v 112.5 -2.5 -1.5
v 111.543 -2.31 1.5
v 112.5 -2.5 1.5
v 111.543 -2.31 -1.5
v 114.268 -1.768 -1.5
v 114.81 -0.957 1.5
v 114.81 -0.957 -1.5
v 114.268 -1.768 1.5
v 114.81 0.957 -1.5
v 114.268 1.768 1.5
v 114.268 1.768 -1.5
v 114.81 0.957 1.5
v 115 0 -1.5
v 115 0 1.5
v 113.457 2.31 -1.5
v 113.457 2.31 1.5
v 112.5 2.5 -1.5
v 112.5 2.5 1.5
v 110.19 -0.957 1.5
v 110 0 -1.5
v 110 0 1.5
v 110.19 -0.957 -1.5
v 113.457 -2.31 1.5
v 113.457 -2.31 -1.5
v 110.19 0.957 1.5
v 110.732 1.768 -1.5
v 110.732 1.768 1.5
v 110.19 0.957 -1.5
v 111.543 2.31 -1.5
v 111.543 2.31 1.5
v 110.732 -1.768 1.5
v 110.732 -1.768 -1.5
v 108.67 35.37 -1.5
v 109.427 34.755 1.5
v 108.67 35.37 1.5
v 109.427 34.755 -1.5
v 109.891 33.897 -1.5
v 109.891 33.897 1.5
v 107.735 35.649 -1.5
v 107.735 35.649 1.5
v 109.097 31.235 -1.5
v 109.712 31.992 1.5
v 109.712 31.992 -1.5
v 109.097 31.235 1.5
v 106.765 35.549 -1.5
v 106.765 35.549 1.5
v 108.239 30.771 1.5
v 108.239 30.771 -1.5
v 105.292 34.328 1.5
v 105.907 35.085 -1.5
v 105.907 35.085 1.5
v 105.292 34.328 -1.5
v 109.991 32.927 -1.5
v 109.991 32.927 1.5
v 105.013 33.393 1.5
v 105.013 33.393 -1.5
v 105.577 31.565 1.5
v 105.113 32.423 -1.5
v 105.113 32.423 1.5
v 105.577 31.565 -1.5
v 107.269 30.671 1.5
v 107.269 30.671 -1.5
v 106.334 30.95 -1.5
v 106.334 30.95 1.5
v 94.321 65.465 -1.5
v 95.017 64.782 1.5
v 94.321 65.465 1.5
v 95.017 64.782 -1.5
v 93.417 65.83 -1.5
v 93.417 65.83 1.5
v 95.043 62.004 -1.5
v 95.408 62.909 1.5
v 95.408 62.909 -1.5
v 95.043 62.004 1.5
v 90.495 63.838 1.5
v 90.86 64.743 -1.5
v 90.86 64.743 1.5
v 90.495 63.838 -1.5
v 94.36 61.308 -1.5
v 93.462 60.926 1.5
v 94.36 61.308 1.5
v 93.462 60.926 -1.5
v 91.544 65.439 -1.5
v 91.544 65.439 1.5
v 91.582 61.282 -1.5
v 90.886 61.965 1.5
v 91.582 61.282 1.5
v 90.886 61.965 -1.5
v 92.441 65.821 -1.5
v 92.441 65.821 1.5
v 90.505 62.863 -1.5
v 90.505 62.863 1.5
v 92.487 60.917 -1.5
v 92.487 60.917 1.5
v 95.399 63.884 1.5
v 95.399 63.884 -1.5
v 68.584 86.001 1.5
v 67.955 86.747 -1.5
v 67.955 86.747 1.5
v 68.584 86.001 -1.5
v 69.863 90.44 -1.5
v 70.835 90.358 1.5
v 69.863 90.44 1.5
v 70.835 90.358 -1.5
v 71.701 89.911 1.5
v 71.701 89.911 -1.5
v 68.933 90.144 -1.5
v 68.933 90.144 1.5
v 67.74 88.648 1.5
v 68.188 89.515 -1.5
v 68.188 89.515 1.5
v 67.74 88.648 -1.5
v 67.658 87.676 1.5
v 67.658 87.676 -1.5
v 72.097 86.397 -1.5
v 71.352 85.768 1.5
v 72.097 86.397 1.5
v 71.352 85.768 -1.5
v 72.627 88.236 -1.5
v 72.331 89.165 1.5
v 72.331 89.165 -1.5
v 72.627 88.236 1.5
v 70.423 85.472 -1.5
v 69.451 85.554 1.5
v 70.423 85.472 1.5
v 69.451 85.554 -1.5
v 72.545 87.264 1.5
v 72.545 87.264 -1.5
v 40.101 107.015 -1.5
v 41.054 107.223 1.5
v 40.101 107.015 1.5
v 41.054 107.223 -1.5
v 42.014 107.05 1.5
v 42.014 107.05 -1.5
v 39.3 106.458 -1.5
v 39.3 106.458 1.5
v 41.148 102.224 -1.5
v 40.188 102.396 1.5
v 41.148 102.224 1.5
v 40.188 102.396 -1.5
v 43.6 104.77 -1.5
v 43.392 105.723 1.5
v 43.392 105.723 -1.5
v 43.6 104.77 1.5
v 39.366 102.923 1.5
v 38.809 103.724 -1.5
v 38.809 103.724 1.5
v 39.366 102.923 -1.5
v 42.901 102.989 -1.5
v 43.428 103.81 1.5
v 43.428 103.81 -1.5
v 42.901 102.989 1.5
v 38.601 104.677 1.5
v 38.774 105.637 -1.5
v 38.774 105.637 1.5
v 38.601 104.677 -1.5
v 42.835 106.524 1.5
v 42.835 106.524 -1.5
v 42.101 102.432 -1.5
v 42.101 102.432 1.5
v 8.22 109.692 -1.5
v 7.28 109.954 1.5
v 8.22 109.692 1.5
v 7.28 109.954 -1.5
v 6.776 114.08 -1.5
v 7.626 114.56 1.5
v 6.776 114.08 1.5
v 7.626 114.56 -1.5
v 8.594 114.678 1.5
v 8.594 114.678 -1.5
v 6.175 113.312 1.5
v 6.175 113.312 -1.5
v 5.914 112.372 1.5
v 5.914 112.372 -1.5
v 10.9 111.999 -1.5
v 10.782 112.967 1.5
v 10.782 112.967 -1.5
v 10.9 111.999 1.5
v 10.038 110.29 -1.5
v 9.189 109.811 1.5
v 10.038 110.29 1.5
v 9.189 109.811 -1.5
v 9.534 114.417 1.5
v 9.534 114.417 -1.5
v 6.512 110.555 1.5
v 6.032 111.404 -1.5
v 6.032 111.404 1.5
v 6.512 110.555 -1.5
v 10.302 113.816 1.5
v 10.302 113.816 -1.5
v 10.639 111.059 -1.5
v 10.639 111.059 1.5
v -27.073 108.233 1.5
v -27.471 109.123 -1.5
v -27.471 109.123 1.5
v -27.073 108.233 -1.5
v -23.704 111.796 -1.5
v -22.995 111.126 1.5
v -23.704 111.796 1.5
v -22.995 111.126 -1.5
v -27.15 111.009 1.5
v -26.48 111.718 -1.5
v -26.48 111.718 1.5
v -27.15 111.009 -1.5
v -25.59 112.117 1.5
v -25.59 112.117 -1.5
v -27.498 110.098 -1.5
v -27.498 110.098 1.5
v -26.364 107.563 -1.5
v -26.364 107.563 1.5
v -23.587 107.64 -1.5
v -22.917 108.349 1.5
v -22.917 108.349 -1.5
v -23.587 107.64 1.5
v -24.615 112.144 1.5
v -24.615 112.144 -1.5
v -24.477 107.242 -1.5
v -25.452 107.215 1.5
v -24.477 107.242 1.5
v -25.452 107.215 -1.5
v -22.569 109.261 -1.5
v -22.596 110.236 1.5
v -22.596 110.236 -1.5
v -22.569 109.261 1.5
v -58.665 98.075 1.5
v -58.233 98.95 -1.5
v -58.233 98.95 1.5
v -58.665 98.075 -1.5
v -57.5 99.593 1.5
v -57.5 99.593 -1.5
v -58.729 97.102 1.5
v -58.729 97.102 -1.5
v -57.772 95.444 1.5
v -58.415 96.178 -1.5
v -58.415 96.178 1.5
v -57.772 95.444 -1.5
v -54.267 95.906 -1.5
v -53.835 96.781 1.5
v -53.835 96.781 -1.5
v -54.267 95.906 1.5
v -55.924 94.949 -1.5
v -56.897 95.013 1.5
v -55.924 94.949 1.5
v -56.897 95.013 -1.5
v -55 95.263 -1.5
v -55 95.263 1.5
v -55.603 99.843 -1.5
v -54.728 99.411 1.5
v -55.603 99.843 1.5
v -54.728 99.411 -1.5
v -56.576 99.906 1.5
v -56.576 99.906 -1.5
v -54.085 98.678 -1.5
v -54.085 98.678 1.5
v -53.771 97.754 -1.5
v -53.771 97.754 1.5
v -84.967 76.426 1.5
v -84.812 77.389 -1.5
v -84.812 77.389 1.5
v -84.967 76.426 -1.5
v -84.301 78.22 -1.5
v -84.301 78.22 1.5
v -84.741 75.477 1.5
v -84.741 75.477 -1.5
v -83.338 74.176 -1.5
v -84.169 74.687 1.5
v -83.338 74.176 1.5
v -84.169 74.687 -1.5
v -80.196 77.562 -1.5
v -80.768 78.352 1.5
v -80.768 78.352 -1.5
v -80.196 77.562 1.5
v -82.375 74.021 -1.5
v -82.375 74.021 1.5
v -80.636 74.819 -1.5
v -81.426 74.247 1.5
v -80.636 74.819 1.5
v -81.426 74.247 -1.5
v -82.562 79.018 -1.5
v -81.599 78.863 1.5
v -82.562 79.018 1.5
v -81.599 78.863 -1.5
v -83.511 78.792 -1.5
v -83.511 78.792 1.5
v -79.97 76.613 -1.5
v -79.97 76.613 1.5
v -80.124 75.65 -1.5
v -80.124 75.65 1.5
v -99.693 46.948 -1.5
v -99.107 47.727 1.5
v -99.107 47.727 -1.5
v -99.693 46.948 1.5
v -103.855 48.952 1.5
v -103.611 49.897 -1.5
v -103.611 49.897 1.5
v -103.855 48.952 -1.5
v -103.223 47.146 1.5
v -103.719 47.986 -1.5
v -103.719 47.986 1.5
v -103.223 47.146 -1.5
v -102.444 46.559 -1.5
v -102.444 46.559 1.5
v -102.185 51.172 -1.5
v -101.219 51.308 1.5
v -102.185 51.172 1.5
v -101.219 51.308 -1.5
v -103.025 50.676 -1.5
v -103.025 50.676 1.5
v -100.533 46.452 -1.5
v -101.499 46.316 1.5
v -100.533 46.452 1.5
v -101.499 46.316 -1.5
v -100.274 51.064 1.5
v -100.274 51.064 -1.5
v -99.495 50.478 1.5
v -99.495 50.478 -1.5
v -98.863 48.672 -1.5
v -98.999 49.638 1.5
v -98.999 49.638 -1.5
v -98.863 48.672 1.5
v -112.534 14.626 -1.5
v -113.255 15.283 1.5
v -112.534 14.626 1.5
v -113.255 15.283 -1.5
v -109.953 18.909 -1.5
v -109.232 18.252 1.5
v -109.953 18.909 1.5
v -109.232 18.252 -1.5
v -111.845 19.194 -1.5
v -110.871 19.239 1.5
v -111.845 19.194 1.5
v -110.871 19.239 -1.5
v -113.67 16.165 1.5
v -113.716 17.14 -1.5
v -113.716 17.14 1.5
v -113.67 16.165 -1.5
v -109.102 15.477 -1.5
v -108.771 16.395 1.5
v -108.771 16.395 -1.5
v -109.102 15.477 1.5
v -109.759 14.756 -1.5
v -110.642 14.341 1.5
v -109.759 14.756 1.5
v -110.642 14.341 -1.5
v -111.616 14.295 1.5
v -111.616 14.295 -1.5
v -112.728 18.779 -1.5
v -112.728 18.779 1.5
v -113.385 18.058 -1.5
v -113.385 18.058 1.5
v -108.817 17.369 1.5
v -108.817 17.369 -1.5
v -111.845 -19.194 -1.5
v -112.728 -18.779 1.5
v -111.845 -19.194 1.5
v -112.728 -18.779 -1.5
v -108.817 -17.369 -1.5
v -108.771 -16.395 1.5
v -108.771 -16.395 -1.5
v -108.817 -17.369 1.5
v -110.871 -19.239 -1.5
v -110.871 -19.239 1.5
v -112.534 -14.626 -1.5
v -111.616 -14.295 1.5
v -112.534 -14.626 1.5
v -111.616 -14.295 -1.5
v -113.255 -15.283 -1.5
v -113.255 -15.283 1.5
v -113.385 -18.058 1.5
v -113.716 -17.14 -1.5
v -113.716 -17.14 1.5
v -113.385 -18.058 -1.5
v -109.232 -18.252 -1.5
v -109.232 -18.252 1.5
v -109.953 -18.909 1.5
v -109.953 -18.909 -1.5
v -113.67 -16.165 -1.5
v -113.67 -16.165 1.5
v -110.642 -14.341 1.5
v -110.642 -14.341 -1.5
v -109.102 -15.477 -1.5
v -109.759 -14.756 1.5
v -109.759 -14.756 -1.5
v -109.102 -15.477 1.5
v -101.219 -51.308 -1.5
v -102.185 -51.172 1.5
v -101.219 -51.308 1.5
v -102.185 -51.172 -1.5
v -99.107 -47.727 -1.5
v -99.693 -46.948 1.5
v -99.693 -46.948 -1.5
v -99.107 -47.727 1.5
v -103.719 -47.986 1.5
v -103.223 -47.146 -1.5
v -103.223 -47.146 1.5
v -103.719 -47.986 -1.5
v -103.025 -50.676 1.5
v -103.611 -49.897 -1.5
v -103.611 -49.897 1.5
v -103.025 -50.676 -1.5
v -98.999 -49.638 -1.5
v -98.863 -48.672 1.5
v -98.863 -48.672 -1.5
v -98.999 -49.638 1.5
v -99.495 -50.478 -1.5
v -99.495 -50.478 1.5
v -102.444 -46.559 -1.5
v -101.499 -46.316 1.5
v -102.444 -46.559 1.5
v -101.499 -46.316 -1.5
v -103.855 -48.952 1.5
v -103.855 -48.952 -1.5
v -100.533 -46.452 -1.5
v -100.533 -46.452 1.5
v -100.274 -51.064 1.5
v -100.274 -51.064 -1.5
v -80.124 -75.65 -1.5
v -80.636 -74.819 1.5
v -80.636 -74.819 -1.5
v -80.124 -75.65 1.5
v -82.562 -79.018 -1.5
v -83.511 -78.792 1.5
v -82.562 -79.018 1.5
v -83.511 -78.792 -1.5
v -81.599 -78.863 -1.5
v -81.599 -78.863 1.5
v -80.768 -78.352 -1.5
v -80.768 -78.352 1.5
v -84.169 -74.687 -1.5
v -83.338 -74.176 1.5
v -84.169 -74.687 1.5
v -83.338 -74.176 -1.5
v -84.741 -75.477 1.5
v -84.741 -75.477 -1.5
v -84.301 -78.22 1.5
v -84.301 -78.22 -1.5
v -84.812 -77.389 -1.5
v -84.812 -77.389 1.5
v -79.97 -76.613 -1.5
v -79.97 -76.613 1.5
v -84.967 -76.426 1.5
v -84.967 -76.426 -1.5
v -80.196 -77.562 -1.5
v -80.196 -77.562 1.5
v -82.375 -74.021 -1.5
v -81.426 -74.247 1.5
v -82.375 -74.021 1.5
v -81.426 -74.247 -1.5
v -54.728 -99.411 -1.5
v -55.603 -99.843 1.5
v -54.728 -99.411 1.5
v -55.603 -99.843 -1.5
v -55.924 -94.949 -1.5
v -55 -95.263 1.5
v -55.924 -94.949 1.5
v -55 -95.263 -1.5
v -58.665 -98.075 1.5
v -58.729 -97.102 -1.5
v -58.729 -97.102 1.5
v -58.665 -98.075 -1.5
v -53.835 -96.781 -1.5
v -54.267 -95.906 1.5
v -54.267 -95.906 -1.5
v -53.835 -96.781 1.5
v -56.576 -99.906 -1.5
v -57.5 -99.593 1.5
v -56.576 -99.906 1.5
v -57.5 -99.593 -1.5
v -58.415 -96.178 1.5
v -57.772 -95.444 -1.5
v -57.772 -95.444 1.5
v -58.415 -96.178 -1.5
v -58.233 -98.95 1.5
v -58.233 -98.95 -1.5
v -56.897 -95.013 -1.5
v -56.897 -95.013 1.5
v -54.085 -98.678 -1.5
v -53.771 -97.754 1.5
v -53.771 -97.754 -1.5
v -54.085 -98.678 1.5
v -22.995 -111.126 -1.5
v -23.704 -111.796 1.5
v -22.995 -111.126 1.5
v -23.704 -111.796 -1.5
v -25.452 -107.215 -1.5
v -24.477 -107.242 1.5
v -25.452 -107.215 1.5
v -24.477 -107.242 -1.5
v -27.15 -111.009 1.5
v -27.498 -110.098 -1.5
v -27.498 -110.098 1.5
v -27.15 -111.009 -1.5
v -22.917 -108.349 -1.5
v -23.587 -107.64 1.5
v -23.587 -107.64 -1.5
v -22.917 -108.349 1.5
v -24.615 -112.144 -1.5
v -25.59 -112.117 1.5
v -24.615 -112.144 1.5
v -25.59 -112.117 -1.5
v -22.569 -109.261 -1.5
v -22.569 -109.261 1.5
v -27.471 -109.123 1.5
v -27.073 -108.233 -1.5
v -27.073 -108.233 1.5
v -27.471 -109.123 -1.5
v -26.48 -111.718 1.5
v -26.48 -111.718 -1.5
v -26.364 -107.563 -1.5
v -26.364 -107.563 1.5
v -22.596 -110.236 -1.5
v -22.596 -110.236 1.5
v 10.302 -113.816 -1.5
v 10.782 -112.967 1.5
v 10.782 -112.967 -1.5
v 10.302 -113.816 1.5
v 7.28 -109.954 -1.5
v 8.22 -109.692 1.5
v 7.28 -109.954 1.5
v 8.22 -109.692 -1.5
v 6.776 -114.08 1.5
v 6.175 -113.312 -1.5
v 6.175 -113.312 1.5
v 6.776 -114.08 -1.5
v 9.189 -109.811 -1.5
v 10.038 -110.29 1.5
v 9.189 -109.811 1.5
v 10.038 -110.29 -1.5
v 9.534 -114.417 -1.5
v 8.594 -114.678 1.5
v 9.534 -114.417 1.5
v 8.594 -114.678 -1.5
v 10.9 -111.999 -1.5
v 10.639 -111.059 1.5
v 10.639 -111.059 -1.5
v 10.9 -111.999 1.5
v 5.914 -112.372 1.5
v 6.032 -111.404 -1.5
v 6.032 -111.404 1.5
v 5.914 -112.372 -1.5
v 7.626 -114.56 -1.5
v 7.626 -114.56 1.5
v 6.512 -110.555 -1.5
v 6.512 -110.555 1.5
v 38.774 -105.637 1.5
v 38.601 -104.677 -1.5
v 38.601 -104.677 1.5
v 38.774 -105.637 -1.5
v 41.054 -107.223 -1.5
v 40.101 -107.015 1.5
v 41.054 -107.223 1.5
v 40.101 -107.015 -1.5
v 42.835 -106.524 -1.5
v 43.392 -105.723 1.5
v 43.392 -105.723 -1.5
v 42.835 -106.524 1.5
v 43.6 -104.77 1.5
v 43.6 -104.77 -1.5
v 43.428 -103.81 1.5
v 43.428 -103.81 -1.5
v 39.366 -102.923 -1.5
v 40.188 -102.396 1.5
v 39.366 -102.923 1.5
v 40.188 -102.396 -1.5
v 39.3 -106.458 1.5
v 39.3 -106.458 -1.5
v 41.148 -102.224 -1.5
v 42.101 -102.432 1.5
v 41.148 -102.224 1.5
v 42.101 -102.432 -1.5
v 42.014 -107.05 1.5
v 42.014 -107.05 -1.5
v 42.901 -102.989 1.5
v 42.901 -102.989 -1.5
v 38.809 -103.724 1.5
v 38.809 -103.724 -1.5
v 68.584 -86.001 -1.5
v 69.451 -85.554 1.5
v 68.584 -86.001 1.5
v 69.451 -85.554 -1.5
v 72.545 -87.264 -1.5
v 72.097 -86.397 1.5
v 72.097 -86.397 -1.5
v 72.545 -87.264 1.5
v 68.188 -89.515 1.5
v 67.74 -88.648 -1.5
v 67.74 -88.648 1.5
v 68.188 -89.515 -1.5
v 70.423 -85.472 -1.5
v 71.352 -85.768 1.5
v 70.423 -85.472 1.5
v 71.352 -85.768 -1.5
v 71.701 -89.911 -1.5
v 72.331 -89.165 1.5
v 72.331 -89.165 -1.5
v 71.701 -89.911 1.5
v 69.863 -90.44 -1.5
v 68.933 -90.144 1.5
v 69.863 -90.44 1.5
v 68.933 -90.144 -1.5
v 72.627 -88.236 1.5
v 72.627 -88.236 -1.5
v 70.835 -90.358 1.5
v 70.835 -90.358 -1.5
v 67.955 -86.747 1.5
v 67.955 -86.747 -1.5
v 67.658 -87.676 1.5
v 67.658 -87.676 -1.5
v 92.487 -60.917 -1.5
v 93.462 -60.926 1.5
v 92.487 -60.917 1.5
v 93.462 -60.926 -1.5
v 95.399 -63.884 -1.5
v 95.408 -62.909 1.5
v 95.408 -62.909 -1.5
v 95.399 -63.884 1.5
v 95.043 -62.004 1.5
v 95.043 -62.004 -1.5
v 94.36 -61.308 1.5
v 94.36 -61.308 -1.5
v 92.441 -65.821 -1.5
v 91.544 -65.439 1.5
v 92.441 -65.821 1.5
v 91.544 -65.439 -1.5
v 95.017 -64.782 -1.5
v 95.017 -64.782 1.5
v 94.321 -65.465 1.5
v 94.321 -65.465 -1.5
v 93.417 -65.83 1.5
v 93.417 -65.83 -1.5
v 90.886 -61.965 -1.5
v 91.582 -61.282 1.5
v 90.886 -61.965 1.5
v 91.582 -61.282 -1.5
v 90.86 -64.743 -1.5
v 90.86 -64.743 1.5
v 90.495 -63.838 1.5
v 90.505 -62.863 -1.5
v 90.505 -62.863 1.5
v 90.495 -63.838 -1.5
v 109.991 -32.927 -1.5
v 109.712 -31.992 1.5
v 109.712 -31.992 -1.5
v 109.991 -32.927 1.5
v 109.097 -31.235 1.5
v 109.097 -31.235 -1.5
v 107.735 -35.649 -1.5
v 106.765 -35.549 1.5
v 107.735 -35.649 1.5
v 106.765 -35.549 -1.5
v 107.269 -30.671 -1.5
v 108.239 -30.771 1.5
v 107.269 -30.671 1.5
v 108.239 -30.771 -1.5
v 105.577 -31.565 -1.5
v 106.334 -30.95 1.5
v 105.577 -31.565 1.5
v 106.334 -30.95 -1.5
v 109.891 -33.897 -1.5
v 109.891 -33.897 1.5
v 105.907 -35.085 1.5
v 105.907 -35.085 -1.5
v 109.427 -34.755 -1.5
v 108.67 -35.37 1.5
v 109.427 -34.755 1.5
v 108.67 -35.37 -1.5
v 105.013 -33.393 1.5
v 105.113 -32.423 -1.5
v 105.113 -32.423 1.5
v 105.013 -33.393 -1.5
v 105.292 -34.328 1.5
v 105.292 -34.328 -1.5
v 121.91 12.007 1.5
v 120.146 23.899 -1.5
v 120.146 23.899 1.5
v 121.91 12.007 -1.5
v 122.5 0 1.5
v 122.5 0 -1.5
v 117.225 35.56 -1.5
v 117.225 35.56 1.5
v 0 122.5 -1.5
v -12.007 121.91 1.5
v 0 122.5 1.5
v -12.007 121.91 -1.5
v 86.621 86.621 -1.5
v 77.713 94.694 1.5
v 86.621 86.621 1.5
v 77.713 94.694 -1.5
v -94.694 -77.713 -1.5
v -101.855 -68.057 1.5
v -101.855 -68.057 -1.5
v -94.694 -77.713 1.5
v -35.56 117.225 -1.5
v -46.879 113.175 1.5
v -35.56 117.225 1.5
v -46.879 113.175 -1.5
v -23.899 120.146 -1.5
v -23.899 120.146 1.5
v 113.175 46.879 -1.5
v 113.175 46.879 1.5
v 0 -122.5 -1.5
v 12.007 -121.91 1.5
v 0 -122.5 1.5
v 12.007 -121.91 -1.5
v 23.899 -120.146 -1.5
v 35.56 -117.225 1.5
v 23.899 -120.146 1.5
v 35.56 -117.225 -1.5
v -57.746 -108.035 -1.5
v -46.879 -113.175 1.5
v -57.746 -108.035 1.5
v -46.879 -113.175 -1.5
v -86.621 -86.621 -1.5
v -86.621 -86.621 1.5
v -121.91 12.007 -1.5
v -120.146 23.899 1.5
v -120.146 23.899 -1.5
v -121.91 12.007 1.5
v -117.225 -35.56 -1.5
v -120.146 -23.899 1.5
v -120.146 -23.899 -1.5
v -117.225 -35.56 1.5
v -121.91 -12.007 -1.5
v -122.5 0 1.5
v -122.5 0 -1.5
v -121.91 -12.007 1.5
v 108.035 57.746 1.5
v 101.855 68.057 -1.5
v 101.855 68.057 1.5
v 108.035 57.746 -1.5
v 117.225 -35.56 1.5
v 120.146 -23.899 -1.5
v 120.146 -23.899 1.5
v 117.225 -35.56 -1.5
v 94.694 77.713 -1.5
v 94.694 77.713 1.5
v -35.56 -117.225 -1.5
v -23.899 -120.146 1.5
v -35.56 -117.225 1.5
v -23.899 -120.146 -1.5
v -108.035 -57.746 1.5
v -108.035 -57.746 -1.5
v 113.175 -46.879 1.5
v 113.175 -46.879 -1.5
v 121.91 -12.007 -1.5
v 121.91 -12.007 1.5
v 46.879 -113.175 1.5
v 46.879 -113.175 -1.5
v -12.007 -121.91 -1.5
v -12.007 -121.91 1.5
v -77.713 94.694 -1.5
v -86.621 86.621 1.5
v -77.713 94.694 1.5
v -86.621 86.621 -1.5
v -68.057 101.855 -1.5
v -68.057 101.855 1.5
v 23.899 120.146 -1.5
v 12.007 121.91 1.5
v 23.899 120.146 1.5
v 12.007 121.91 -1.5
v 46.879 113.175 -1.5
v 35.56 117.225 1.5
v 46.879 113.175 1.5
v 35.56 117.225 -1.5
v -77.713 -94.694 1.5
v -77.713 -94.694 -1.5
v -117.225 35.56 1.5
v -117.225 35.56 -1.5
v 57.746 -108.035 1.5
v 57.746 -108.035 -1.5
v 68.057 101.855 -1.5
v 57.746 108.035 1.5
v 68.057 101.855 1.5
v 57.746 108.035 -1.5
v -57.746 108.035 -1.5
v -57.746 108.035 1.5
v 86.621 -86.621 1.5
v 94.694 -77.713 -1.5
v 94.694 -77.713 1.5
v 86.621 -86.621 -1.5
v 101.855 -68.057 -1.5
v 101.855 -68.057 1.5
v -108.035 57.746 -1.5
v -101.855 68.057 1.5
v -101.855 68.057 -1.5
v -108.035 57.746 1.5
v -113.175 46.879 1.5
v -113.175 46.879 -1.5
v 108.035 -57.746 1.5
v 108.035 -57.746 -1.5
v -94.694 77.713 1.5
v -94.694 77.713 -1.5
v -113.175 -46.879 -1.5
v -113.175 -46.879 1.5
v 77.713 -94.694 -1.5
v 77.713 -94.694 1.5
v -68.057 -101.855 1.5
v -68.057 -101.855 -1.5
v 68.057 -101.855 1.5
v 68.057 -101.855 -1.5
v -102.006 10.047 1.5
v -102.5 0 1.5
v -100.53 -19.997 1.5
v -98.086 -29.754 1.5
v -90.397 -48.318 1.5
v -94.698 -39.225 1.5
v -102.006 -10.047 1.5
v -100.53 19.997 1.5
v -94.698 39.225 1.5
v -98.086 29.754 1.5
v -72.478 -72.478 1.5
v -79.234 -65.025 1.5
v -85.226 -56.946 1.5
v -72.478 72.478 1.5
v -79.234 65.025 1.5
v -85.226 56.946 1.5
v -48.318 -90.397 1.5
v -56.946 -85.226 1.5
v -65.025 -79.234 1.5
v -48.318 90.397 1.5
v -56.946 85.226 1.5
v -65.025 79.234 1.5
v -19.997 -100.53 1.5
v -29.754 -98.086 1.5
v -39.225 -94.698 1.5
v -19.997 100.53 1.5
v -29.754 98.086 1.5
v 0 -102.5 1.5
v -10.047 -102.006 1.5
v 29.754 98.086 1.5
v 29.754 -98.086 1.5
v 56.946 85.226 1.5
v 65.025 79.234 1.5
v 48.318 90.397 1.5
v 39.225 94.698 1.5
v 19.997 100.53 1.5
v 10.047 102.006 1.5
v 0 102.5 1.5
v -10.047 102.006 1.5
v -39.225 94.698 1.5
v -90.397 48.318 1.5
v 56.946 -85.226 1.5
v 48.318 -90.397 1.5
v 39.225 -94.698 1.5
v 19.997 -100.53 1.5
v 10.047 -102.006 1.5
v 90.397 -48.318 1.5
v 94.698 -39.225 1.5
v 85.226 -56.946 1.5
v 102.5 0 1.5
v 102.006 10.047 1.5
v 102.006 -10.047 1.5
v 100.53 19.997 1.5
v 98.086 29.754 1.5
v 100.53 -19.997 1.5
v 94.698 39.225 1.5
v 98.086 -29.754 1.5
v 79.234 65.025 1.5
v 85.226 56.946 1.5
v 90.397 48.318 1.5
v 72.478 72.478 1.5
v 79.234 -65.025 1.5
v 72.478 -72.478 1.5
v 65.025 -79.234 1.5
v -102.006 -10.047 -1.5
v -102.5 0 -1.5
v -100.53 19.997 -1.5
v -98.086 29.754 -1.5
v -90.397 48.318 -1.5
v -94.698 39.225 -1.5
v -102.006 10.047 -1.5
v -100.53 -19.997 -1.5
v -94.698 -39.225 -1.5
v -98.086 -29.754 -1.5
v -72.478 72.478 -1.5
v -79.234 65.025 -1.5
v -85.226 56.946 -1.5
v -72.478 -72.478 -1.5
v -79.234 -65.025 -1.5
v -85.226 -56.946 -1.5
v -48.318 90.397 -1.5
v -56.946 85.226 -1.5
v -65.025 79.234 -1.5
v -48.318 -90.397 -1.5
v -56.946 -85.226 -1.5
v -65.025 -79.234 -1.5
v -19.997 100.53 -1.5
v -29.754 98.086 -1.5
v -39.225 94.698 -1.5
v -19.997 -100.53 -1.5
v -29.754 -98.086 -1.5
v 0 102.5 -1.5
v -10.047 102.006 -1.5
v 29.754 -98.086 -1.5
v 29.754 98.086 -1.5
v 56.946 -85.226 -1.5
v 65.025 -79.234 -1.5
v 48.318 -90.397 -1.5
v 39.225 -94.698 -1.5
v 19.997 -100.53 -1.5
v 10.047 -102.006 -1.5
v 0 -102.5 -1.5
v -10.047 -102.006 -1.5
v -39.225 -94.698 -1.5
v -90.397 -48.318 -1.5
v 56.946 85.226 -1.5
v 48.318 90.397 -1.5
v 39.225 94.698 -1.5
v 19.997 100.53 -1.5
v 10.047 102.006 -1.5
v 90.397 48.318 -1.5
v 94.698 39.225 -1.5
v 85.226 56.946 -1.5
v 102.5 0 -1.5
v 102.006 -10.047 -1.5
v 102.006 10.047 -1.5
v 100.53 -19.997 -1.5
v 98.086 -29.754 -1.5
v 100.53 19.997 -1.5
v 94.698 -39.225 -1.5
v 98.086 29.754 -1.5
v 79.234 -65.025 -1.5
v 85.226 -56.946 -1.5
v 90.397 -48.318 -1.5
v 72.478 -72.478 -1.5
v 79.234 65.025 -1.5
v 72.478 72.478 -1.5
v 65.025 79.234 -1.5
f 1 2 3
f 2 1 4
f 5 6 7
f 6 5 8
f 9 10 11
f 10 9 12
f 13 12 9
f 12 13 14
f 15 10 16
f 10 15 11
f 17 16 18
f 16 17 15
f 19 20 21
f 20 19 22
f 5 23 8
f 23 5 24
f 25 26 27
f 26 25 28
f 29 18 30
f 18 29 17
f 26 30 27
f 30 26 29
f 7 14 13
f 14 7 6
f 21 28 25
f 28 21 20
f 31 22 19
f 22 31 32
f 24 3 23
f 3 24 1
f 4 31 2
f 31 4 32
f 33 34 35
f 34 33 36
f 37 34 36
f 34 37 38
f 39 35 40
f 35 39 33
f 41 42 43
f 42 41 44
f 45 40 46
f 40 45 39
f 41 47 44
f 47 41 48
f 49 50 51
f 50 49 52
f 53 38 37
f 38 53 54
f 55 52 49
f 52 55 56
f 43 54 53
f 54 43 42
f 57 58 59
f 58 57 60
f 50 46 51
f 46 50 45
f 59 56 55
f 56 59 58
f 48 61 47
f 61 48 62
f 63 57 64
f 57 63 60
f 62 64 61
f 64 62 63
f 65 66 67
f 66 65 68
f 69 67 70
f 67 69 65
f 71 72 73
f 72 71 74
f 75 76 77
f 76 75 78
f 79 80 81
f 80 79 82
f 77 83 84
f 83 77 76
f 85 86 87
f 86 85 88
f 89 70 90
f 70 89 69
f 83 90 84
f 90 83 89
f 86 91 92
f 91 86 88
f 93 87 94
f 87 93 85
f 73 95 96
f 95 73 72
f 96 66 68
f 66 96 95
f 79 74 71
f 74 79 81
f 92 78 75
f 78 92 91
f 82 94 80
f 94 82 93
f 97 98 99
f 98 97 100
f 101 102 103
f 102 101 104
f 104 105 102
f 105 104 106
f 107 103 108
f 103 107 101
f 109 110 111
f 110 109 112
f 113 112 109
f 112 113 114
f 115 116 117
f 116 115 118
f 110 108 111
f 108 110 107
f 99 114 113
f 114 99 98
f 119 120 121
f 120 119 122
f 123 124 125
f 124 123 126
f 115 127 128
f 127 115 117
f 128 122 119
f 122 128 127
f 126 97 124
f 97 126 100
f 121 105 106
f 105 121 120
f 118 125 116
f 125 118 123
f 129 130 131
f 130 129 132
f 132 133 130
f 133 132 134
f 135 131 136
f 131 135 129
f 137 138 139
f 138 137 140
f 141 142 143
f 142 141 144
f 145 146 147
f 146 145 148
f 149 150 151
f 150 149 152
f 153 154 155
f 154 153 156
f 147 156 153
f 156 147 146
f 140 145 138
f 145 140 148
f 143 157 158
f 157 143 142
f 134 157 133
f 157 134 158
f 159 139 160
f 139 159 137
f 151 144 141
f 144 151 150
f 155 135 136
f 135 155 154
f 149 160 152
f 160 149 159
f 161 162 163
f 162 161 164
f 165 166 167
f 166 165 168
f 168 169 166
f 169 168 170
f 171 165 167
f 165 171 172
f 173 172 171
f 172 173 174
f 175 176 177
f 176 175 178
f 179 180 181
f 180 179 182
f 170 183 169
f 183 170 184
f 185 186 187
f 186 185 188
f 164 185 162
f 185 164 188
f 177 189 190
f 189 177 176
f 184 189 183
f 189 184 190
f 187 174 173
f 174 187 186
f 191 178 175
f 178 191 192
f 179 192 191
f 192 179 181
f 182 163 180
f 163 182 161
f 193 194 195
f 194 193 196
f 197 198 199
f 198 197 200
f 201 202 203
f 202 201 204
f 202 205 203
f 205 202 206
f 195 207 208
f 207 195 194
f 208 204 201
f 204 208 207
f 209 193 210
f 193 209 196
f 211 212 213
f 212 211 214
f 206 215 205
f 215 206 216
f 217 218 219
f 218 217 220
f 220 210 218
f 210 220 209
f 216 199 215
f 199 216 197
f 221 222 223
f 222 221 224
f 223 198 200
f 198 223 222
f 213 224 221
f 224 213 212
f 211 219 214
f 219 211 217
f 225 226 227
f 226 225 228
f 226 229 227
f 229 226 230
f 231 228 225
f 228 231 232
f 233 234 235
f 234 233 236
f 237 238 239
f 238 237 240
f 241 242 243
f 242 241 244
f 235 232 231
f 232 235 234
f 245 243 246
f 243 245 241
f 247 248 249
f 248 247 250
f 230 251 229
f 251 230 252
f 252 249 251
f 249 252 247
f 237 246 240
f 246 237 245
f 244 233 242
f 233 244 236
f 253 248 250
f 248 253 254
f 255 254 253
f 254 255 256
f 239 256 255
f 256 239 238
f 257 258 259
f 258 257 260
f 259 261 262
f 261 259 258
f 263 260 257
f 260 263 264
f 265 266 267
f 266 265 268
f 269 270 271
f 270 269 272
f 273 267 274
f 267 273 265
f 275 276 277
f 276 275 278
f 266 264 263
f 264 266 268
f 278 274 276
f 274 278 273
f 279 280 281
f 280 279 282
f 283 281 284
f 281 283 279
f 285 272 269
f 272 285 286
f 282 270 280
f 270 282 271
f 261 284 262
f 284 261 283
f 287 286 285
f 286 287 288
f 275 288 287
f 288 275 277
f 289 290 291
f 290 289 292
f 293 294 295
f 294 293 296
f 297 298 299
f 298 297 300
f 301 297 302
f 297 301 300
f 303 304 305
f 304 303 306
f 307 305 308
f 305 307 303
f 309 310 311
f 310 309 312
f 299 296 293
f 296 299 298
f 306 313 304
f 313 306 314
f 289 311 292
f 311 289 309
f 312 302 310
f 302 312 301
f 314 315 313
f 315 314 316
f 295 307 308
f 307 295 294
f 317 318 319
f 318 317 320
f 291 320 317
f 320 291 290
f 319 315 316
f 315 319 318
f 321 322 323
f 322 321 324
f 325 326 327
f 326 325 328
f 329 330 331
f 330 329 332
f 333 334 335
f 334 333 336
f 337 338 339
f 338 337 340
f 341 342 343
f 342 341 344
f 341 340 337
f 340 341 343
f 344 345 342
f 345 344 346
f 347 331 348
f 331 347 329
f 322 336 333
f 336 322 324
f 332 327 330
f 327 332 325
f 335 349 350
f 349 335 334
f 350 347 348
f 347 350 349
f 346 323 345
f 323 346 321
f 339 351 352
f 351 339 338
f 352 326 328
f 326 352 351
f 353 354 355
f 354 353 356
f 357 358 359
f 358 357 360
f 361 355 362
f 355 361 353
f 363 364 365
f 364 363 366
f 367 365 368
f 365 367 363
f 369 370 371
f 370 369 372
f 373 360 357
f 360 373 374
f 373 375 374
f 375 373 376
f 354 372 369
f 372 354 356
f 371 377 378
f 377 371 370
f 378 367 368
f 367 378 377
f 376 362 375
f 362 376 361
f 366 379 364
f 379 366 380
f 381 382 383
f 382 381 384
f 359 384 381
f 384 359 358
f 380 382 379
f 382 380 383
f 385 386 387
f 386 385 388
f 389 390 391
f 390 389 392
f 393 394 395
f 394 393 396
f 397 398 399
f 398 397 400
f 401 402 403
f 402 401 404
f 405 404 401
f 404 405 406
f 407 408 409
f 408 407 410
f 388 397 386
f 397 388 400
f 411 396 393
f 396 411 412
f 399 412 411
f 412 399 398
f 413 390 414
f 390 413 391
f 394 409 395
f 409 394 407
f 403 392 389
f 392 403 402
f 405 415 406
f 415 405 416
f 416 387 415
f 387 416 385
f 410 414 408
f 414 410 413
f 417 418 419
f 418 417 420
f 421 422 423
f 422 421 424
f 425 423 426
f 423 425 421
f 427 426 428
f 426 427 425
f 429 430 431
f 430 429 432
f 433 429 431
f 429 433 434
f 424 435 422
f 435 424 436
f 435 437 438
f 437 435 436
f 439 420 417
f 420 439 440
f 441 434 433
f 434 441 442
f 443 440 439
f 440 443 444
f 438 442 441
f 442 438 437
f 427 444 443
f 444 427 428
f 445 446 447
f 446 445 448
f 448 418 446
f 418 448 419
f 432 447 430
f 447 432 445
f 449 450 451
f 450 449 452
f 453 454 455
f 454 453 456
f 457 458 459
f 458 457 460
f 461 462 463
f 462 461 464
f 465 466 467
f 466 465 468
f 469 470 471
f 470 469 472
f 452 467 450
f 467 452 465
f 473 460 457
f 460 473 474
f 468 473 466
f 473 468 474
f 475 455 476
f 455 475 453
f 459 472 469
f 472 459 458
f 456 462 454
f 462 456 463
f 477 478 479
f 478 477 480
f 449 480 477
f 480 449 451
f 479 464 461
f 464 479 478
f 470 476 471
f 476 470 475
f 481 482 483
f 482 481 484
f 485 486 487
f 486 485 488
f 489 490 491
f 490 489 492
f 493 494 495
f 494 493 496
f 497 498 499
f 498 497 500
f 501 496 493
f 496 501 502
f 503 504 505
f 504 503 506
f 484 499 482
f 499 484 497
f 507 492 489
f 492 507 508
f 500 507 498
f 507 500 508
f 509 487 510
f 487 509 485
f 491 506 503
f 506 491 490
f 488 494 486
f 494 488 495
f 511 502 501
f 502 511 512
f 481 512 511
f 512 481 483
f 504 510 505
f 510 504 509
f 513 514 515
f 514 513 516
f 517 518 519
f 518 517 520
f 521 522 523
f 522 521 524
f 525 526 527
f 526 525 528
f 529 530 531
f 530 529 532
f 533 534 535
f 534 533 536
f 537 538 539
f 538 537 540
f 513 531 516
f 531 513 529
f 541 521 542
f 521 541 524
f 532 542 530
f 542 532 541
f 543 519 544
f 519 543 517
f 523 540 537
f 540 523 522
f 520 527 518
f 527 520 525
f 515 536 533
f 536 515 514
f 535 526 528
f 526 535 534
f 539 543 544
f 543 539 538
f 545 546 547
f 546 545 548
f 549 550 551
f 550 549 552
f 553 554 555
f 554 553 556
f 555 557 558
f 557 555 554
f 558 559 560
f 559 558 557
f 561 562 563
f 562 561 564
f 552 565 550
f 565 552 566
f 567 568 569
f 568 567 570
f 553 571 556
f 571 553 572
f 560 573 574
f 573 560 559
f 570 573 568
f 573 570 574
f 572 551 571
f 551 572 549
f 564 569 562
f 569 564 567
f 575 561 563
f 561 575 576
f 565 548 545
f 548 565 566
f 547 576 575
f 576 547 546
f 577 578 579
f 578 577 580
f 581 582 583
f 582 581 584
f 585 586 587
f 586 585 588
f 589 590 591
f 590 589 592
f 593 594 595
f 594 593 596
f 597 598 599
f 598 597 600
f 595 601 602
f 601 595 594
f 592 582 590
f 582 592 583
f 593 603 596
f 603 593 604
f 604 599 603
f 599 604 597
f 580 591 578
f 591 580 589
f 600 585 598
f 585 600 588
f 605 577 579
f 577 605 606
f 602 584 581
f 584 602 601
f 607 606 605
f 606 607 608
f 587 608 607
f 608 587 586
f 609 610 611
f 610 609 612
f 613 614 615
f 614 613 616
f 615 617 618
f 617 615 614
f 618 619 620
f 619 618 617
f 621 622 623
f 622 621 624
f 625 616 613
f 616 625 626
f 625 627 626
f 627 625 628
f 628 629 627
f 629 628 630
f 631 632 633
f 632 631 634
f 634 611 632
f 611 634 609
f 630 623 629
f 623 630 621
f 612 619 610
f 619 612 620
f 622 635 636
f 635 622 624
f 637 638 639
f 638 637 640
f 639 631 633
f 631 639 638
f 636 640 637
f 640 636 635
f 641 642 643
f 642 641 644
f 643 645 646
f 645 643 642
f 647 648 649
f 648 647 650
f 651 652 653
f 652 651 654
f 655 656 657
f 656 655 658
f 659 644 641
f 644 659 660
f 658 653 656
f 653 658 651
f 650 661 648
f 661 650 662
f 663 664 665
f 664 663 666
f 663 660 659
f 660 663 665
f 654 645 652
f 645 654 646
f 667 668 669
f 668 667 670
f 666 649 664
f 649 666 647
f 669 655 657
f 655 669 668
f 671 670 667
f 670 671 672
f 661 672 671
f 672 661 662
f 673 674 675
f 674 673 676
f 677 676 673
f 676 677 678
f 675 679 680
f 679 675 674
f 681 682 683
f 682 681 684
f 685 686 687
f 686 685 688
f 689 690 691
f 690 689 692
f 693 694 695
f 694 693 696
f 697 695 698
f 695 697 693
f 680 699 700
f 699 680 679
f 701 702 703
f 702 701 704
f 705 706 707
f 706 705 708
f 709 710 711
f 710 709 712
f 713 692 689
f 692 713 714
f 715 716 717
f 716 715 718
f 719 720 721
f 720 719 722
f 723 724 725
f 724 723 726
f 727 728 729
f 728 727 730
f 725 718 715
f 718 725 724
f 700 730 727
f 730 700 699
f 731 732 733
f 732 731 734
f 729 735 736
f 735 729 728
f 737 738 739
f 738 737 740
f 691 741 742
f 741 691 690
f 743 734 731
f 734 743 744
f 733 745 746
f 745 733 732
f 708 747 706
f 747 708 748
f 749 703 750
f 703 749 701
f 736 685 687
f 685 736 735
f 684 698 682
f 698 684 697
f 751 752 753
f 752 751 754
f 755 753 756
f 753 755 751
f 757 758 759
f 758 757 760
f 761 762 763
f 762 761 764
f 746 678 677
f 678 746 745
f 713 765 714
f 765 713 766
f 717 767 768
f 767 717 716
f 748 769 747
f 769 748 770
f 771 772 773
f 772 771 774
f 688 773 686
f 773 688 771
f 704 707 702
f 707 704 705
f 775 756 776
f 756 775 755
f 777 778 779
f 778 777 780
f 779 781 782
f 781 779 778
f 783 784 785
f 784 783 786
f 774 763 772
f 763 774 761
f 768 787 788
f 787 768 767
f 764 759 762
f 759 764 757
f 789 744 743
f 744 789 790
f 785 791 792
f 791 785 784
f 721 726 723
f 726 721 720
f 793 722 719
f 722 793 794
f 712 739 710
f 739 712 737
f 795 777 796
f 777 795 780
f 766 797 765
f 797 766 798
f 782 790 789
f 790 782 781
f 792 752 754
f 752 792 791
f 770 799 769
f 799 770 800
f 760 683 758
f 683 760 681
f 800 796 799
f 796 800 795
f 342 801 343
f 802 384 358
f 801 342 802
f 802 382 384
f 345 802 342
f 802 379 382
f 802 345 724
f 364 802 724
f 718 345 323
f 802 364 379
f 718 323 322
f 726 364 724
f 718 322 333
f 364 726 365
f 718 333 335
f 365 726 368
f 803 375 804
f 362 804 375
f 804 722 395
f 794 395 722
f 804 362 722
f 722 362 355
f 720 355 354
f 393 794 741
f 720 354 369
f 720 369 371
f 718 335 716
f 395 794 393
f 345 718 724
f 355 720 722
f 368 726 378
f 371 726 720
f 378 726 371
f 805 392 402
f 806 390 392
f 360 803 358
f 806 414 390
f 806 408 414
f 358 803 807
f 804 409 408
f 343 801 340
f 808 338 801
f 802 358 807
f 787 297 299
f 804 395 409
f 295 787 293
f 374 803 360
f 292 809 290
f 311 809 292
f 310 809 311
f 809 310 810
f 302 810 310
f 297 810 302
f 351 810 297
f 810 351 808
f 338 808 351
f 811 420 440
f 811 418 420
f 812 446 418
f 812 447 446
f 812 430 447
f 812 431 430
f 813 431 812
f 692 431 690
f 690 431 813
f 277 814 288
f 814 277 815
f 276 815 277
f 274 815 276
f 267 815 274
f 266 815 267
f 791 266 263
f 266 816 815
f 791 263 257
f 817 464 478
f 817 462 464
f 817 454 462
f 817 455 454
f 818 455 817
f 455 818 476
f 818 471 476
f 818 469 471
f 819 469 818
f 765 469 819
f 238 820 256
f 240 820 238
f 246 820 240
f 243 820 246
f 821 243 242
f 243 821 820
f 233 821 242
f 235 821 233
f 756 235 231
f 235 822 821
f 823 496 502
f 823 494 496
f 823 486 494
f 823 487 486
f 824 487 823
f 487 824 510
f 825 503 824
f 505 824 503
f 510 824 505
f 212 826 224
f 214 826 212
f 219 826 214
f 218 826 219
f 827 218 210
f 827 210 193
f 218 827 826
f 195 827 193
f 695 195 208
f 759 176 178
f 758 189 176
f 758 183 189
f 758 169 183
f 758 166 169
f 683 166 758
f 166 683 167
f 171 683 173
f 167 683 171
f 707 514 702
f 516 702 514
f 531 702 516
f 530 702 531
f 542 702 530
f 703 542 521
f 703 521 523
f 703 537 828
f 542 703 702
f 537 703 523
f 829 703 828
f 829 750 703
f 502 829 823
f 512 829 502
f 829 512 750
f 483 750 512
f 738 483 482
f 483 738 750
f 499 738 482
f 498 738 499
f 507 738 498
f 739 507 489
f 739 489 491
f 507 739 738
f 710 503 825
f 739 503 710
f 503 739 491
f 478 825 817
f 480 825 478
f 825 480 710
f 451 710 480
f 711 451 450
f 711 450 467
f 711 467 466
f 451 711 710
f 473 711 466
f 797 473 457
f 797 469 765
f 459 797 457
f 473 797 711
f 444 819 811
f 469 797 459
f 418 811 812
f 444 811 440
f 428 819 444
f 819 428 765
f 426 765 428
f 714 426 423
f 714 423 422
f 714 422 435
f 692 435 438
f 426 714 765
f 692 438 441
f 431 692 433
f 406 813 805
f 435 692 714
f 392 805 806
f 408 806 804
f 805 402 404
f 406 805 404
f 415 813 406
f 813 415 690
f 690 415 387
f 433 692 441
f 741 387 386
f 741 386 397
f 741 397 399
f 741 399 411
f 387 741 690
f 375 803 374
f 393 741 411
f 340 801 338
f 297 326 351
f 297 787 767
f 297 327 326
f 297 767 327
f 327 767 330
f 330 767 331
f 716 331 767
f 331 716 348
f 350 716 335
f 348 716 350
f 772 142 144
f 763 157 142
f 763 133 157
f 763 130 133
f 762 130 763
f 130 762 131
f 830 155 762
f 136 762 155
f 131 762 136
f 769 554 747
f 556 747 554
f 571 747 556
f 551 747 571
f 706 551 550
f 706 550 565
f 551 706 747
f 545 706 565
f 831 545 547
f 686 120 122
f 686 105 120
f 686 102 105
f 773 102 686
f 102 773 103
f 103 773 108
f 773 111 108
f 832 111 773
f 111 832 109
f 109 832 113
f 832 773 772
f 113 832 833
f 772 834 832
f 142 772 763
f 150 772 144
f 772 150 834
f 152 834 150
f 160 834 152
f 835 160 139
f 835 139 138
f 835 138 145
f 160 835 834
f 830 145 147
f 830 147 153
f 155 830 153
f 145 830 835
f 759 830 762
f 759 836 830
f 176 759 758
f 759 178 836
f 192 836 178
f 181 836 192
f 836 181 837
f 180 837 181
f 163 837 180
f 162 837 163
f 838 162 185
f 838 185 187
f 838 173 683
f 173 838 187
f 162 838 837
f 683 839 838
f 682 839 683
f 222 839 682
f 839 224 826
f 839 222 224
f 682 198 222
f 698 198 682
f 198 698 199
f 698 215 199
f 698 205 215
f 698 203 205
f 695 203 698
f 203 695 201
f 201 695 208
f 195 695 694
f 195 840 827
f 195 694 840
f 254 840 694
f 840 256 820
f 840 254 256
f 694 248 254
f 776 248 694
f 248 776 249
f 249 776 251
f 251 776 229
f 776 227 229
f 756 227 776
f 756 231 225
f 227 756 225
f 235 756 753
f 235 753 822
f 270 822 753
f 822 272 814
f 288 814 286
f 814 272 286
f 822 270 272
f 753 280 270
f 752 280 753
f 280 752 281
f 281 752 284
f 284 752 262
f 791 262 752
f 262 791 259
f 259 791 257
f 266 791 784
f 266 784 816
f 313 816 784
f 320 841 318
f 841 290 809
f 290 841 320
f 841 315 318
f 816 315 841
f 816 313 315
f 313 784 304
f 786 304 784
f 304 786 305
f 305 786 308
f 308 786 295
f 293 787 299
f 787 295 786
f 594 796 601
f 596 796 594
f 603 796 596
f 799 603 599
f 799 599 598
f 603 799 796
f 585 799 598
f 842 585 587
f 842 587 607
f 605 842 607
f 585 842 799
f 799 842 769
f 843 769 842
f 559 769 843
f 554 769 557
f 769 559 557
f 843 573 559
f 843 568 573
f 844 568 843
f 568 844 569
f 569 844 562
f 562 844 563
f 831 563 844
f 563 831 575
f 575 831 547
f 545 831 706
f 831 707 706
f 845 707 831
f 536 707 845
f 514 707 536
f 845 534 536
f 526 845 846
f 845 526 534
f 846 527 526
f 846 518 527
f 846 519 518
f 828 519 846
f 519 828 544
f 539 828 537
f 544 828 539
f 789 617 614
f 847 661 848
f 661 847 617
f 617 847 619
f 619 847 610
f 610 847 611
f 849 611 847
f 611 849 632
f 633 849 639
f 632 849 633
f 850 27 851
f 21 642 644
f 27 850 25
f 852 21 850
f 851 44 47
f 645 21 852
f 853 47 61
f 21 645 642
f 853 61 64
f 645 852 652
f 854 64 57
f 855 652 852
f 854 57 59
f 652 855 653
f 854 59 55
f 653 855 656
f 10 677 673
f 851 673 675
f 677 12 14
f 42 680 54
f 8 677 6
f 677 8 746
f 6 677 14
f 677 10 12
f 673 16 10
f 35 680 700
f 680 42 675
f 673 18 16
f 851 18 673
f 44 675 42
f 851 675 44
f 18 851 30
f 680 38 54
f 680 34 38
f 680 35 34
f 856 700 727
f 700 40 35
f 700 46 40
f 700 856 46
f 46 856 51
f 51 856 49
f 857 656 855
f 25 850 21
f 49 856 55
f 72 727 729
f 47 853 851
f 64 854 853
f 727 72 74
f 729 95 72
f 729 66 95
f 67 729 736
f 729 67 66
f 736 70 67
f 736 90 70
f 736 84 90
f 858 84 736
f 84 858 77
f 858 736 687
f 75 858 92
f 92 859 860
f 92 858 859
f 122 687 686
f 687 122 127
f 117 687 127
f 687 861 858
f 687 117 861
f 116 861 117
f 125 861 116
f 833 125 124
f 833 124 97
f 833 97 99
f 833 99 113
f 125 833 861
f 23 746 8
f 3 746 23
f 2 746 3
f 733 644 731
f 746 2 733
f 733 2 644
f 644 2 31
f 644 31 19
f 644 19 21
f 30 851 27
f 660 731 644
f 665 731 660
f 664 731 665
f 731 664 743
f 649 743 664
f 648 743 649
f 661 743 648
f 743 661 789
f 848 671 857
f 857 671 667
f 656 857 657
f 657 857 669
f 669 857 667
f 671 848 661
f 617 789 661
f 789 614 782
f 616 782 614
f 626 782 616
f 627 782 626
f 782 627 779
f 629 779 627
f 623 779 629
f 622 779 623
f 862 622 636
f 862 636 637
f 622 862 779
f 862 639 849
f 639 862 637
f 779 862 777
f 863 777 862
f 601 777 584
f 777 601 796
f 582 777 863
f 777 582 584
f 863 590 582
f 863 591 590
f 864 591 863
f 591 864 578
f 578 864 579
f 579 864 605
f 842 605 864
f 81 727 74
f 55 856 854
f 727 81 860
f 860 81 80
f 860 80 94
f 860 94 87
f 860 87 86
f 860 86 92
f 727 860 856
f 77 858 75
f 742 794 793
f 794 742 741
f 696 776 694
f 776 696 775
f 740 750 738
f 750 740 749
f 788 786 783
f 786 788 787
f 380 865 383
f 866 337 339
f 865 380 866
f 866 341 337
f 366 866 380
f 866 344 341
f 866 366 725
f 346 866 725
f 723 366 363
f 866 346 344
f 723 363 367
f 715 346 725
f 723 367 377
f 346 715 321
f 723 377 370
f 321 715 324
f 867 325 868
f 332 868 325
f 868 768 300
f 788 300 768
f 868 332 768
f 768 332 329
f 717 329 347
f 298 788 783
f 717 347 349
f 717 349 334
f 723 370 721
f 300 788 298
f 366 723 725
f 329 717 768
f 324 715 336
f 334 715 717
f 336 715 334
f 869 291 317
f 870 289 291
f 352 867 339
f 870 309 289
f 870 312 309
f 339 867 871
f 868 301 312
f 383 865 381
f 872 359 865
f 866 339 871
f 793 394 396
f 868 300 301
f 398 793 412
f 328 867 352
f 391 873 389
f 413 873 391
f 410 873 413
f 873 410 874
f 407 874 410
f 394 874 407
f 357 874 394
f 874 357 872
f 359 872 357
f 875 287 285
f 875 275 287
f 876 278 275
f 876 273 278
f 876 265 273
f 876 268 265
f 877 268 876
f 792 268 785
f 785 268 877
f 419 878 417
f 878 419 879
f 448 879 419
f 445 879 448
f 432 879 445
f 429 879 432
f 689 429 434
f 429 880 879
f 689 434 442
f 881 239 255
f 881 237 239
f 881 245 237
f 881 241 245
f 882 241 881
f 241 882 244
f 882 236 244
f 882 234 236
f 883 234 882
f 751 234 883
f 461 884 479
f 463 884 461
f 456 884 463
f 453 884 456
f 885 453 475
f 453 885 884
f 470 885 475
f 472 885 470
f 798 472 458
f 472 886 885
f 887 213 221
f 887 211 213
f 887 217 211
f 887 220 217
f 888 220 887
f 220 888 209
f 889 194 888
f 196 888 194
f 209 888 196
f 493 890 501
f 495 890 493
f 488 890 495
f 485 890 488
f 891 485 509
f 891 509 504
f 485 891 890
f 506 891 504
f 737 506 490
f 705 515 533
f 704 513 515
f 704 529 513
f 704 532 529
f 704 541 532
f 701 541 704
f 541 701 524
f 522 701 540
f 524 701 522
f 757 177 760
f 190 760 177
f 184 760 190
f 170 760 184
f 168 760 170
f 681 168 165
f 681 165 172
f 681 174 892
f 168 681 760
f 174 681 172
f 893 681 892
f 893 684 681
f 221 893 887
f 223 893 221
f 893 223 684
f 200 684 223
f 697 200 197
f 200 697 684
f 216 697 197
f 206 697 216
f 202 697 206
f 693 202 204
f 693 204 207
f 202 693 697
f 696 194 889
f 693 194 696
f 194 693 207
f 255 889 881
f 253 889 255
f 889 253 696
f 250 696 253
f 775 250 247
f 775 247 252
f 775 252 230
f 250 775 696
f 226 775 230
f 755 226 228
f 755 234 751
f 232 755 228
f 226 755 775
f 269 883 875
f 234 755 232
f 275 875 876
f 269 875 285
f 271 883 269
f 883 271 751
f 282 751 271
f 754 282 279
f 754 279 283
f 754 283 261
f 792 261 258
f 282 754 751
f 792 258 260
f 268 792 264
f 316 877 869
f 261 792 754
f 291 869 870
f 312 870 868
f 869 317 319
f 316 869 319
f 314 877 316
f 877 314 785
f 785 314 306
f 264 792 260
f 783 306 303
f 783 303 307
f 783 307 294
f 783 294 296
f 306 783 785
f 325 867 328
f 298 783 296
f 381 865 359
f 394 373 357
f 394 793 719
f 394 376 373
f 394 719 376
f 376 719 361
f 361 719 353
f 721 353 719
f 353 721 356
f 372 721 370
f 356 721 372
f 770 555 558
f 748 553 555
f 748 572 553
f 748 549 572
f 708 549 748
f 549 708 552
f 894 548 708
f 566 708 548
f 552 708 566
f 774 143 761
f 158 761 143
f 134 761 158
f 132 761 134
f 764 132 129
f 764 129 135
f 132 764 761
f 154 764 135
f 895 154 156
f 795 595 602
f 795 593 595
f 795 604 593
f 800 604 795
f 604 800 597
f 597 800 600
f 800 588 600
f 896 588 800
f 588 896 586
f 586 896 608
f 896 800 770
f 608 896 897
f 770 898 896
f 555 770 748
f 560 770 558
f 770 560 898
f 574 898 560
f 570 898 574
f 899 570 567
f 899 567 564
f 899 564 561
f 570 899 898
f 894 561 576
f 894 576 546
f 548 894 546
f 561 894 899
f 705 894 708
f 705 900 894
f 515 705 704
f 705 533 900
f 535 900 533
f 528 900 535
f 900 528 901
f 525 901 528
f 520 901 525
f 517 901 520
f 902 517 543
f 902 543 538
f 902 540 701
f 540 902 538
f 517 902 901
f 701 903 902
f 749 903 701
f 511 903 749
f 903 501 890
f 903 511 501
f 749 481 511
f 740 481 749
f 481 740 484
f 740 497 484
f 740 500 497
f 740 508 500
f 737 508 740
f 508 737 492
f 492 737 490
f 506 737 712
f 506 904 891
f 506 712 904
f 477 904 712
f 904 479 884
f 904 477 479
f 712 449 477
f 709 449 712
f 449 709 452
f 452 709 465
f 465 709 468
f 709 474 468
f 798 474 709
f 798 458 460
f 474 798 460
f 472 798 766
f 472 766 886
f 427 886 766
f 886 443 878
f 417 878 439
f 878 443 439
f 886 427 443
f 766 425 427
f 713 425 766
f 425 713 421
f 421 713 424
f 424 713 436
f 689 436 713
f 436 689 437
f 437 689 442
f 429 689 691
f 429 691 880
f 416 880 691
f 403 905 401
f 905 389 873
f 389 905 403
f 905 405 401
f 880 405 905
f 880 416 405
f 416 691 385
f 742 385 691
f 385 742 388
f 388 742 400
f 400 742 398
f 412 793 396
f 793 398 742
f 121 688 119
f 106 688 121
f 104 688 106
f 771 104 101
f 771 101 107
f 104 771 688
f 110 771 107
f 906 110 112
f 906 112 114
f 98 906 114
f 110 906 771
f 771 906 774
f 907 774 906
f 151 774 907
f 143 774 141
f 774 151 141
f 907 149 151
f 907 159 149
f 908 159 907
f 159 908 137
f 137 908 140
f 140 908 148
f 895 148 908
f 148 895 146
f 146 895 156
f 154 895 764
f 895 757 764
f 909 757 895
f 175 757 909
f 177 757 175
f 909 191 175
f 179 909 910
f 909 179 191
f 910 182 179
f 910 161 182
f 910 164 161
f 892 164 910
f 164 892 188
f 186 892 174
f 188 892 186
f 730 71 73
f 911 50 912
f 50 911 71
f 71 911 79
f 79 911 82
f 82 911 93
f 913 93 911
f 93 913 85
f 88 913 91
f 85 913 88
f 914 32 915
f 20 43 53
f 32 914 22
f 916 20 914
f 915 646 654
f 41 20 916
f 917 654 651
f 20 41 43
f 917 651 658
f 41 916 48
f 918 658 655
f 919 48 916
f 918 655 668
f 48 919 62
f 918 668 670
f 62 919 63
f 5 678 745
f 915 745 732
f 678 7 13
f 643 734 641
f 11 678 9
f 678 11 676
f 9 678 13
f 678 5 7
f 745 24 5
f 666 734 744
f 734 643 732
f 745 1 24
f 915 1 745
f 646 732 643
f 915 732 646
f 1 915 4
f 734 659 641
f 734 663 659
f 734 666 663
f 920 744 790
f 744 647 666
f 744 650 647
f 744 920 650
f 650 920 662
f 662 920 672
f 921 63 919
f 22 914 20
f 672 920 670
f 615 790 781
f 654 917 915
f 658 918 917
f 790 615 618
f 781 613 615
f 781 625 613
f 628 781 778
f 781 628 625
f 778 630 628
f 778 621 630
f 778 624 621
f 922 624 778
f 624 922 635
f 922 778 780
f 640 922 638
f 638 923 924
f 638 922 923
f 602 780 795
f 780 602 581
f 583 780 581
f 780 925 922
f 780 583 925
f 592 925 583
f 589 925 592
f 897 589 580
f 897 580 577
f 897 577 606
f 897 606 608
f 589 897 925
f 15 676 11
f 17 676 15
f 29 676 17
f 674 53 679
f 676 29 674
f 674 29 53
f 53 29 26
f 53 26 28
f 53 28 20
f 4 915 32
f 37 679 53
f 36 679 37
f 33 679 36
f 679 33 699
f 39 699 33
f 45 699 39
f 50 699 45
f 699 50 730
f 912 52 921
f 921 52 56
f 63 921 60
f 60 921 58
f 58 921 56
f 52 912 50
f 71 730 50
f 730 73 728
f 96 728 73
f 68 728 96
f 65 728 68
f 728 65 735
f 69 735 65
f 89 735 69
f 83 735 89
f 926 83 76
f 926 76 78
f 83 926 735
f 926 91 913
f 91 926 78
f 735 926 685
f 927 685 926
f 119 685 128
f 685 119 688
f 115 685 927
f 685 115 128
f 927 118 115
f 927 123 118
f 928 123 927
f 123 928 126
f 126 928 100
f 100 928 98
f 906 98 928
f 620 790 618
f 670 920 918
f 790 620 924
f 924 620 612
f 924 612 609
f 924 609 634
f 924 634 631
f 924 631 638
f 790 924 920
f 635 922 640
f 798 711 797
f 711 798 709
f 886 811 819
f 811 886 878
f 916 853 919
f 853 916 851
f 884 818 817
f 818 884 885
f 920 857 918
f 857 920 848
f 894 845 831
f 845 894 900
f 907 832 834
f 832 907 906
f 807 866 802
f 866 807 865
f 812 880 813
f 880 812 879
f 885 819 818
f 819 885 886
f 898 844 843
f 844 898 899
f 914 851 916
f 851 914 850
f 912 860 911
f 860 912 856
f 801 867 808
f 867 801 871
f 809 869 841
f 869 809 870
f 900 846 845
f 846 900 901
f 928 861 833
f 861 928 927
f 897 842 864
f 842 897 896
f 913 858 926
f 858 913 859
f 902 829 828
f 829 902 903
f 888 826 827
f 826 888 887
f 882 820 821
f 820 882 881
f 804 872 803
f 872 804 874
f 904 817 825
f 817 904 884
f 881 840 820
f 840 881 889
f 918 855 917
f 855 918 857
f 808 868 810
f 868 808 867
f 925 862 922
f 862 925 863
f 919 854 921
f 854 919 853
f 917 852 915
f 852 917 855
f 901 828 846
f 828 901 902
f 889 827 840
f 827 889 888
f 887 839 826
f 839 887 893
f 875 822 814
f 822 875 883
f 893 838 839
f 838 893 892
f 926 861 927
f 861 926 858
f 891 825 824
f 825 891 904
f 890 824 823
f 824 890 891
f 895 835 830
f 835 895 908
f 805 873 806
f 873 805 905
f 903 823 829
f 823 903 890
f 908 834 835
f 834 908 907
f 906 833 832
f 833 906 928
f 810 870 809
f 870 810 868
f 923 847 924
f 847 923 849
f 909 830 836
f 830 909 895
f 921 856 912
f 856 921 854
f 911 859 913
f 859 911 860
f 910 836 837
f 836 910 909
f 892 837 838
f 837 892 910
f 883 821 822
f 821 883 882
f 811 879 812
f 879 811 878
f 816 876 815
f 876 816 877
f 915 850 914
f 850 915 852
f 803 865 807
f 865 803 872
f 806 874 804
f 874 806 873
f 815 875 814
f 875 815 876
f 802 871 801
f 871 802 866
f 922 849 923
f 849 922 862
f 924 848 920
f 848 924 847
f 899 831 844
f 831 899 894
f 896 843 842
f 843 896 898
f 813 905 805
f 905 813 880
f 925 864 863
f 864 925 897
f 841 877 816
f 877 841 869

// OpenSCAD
diameter = 225;
width = 10;
hole = 21;
hole_diameter = 5;

difference() {
	cylinder(3,diameter/2+width, diameter/2+width, true, $fn=64);
	cylinder(4,diameter/2-width, diameter/2-width, true, $fn=64);

	for( r = [0 : 360/hole : 360]) {
		rotate([0,0,r])
			translate([diameter/2,0,0])
				cylinder(4,hole_diameter/2,hole_diameter/2, true, $fn=16);
	}
}
